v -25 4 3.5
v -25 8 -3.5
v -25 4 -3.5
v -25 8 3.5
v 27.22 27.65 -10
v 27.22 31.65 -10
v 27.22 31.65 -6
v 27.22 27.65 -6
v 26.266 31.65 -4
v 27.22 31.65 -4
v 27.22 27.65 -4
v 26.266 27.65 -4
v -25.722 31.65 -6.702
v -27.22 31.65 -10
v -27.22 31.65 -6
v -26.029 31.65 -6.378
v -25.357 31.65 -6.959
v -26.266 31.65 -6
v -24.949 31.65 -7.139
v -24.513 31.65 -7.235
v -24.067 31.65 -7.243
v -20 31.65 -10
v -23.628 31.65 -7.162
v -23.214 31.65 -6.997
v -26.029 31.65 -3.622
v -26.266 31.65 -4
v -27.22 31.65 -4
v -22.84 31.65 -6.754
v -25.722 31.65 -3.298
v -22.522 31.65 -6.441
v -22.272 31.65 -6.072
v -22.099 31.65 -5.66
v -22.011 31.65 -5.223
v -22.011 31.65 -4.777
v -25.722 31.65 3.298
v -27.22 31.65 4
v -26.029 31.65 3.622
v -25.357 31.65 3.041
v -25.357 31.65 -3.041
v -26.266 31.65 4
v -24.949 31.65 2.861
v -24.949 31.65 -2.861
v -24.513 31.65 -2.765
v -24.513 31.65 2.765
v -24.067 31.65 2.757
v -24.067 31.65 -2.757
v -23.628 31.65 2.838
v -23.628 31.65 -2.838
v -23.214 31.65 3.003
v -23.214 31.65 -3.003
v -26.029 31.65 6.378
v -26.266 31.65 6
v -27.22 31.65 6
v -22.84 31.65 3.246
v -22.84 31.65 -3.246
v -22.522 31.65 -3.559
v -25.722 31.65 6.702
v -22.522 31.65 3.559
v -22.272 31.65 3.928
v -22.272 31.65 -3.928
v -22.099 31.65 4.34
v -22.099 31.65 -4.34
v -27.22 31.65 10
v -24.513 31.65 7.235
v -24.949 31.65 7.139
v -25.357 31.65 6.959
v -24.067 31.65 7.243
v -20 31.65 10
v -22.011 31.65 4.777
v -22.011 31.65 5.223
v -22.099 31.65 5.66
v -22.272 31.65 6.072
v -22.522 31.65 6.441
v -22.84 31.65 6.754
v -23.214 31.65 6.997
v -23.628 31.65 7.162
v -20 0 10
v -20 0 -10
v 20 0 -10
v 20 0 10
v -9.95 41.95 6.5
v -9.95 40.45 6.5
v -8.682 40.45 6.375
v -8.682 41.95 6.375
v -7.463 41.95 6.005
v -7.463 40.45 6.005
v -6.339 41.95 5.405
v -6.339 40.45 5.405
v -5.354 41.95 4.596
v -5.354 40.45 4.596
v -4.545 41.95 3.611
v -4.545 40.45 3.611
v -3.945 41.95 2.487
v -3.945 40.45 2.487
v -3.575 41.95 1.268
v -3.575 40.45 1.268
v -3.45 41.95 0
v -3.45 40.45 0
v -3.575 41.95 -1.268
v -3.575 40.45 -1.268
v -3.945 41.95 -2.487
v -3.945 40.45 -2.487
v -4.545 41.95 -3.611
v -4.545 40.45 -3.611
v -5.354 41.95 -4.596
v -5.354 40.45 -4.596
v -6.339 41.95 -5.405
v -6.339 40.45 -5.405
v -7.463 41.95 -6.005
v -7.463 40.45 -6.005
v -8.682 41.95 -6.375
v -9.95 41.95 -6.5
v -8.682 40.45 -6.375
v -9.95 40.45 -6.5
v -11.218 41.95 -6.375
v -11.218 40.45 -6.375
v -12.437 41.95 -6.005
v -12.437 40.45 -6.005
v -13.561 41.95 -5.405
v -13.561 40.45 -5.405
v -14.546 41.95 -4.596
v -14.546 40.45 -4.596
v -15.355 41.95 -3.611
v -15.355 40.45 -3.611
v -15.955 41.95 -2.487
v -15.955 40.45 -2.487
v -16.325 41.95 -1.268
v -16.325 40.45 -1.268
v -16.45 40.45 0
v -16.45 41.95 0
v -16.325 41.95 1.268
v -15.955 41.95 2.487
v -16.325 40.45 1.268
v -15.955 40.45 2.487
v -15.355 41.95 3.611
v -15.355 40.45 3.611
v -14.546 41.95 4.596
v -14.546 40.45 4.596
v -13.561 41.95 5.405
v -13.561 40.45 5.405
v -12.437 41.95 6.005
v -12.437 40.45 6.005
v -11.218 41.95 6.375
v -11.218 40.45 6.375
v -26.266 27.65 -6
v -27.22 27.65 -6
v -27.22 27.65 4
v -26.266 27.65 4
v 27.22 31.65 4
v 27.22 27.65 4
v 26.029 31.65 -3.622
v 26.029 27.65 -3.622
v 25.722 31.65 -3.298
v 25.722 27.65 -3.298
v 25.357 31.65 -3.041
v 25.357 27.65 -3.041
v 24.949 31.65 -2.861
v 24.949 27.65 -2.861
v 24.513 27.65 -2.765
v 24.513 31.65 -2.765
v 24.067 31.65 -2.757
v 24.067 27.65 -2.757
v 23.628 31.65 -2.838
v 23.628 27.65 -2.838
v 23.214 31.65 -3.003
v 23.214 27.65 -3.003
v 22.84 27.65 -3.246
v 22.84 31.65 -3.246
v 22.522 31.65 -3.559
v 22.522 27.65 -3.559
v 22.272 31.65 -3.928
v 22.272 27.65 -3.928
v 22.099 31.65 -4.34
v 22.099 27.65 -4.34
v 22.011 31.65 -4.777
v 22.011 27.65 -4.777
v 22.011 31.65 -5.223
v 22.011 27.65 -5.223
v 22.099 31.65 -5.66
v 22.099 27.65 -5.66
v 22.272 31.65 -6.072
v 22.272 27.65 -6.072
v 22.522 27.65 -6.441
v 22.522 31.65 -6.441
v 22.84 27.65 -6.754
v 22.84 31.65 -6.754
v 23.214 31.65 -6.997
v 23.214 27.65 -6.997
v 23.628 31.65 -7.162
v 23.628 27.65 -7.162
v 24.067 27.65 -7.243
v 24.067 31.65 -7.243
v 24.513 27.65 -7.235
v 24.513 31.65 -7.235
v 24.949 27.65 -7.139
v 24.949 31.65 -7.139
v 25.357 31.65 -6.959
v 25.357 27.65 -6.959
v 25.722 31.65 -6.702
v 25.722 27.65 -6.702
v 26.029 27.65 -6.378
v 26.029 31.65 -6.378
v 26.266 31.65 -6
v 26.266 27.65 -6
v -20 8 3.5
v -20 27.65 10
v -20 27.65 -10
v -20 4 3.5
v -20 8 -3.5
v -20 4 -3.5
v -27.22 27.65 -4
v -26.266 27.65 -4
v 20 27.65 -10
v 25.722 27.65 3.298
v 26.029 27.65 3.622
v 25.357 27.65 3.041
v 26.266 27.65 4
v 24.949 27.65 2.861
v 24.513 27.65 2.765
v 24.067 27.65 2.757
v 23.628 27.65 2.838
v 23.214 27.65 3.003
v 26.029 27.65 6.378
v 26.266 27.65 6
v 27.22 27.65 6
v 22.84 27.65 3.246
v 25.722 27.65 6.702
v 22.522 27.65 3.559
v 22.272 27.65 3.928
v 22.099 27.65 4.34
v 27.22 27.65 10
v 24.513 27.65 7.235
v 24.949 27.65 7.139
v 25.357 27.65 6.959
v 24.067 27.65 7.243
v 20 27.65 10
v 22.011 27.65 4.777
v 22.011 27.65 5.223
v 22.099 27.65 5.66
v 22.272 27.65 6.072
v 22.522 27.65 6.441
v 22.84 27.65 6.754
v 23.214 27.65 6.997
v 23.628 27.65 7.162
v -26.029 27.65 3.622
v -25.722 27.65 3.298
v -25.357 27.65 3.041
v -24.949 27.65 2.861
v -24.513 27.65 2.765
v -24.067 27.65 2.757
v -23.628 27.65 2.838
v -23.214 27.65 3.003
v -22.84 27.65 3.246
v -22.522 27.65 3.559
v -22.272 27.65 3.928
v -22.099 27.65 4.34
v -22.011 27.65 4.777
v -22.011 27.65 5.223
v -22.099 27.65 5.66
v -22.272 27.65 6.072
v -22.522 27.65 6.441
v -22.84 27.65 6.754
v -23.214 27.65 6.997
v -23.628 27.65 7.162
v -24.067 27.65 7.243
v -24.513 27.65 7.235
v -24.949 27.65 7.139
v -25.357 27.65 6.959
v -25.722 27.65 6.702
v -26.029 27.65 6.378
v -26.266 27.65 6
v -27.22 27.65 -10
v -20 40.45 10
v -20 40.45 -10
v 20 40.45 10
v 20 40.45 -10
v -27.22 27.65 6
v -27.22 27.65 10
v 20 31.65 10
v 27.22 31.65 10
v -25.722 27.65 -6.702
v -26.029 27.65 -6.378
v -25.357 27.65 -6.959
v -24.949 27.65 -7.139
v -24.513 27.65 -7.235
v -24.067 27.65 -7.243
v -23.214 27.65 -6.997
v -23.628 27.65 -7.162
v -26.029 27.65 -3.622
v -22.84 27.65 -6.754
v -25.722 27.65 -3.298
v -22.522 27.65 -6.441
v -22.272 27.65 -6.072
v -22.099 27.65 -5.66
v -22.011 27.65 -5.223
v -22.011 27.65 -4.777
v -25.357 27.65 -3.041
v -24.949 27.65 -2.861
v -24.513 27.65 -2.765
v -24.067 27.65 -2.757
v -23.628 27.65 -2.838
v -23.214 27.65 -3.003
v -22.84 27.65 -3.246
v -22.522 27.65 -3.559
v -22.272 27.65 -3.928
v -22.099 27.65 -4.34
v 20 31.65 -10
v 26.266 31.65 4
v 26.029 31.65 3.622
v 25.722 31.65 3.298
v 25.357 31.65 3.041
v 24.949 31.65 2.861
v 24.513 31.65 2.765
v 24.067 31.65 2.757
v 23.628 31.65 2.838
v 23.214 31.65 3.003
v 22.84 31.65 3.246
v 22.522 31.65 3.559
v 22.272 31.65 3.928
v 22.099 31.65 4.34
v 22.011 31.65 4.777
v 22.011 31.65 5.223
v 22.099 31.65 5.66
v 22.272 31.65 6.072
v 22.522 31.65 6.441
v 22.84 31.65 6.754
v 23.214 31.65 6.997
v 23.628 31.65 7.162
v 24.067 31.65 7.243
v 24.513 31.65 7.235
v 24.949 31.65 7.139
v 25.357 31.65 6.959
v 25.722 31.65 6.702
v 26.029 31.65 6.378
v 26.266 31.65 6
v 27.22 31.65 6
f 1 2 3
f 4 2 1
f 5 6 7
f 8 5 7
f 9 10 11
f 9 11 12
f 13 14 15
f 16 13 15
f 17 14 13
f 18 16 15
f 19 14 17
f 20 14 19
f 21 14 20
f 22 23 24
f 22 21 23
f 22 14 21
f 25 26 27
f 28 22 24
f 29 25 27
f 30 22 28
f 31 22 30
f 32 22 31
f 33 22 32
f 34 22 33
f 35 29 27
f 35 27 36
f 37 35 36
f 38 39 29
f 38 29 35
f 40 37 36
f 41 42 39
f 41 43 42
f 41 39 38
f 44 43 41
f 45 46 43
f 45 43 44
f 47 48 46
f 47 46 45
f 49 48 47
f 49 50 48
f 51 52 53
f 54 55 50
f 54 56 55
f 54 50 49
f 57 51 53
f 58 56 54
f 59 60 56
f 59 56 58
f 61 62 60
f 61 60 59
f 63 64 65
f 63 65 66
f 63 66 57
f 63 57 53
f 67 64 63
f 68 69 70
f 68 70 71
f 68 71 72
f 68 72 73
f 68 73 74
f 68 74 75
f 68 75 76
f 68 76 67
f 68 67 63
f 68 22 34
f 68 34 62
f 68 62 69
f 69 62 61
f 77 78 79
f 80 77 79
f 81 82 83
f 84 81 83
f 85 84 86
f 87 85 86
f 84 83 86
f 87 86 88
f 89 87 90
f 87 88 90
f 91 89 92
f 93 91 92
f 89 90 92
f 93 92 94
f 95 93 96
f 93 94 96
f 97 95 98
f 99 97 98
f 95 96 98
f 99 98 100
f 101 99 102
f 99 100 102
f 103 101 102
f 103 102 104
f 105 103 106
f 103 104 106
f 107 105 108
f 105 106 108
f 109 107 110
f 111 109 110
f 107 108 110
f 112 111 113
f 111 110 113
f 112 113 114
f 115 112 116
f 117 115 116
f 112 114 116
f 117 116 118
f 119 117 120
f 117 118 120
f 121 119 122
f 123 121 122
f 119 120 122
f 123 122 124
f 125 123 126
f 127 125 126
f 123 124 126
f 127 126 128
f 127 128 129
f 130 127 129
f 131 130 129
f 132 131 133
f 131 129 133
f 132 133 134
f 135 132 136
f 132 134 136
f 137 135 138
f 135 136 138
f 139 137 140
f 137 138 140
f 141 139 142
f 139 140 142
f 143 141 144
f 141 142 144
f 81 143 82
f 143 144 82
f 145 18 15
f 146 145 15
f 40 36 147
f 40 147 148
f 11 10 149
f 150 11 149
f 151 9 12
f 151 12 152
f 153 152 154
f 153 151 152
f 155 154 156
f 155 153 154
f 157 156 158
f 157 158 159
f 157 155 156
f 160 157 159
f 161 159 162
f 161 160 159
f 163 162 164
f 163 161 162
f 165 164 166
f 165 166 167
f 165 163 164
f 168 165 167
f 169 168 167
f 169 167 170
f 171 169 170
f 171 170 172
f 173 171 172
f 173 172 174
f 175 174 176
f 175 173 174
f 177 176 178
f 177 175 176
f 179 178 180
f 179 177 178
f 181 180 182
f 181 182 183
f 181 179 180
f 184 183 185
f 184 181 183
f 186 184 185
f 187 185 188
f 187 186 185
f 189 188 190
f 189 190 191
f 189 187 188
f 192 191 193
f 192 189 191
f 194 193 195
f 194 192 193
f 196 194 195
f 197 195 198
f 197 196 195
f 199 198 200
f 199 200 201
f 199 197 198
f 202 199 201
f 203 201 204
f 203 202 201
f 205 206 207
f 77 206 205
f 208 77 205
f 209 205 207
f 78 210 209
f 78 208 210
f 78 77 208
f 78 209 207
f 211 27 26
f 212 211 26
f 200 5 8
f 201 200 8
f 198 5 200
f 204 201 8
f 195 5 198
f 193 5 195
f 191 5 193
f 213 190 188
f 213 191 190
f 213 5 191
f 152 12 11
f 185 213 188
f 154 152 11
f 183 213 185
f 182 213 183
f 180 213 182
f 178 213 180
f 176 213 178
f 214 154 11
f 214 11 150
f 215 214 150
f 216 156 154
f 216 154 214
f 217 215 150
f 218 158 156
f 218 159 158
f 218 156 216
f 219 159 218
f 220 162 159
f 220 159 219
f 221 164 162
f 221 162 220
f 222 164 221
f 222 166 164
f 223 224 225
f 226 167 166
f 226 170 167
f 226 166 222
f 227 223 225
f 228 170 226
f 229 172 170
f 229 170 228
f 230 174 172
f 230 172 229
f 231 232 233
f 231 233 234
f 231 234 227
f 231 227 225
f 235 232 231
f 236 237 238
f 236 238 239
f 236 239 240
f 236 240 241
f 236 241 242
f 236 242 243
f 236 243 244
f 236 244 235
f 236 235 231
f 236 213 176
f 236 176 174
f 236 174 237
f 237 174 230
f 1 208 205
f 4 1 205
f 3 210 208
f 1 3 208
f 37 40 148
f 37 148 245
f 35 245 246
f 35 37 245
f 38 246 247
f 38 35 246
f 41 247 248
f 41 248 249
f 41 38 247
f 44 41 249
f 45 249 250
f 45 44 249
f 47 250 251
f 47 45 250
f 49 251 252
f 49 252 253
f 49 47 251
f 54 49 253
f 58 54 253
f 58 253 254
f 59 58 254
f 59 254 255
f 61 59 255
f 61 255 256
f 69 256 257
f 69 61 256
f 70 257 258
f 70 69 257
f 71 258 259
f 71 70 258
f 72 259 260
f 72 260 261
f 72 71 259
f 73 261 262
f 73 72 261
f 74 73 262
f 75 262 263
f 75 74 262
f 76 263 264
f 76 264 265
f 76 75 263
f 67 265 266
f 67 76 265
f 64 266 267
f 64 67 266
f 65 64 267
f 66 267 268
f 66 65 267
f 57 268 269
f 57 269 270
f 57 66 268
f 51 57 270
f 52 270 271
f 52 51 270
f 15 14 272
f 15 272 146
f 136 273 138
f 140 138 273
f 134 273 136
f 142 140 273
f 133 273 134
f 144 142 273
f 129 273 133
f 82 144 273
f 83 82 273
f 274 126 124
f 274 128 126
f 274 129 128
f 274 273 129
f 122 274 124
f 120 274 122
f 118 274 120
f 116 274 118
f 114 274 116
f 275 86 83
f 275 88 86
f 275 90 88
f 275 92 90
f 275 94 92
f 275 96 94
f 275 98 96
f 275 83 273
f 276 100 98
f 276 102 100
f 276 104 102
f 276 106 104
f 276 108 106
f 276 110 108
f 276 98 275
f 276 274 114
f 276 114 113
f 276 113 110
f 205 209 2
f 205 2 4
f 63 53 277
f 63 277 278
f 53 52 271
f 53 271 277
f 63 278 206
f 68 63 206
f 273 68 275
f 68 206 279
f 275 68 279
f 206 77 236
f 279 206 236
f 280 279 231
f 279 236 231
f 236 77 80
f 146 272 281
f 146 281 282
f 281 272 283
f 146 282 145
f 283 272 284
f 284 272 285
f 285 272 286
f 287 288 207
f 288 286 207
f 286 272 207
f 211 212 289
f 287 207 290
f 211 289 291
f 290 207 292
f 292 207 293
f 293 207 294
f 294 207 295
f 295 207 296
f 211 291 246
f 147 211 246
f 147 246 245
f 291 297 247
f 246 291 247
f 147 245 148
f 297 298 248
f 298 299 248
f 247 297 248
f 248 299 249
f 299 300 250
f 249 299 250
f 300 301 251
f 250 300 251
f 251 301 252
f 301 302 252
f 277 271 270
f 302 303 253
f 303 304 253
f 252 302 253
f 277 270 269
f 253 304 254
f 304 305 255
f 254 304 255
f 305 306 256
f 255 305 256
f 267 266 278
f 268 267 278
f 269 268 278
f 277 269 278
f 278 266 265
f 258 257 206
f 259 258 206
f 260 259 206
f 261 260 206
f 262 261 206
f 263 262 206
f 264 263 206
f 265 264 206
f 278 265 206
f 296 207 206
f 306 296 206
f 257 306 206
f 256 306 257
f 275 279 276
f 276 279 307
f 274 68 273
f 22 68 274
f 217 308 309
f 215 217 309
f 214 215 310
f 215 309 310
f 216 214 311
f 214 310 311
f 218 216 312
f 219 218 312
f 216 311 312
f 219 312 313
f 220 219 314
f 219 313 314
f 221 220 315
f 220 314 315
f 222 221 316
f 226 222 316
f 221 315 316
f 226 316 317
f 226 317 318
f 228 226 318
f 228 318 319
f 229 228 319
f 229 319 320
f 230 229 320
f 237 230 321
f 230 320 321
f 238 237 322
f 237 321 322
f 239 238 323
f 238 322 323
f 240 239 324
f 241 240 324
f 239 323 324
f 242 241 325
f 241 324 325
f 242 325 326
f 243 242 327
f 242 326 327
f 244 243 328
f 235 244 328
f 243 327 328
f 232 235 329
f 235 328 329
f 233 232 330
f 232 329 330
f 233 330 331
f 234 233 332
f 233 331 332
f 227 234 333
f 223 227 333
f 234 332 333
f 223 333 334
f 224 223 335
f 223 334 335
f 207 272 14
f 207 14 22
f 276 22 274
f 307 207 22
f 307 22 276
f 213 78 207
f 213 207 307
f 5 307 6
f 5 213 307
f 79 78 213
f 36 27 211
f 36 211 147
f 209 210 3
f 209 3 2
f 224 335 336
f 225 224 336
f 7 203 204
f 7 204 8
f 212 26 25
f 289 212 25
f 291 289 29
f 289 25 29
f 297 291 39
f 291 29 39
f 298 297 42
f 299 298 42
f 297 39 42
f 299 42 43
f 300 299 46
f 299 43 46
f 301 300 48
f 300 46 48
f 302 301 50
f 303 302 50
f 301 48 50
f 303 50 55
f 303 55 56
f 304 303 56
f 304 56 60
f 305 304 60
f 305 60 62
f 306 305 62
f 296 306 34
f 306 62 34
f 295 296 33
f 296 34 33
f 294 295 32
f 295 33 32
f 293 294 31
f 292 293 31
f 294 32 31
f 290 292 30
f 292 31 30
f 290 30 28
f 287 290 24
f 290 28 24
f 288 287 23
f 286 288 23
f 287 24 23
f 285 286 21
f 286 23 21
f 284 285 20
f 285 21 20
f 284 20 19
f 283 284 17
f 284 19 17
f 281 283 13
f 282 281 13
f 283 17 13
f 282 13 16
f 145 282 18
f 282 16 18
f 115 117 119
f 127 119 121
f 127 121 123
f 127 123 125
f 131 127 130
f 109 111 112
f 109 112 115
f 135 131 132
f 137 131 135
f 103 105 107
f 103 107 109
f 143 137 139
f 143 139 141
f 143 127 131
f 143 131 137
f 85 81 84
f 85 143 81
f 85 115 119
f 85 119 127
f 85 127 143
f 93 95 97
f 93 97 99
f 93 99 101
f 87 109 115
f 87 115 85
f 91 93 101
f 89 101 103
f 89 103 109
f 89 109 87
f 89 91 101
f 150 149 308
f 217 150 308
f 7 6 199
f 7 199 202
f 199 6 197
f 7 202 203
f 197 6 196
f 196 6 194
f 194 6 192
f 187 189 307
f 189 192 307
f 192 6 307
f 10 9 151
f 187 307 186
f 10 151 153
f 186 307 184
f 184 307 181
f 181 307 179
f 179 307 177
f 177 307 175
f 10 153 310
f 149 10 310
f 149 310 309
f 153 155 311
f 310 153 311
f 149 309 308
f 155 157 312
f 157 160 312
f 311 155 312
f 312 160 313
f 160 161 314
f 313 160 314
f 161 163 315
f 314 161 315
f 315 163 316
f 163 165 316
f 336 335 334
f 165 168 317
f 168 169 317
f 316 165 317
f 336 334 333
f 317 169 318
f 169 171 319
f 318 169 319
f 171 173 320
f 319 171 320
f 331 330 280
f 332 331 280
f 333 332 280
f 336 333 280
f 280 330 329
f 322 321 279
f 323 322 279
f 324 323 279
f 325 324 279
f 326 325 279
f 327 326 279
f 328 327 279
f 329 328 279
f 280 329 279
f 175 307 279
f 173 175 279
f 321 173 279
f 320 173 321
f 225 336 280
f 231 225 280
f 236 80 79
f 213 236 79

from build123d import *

# Parameters (mm, degrees)
SKETCH2_W             = 40
SKETCH2_H             = 20
BOSS_EXTRUDE1_DEPTH   = 27.65
SKETCH3_W             = 7
SKETCH3_H             = 4
BOSS_EXTRUDE2_DEPTH   = 5
SKETCH5_W             = 40
SKETCH5_H             = 20
BOSS_EXTRUDE5_DEPTH   = 12.8
SKETCH7_W             = 20
SKETCH7_H             = 4
BOSS_EXTRUDE6_DEPTH   = 7.22
CUT_EXTRUDE3_DEPTH    = 4
MIRROR11_COPY_1_DEPTH = 4
SKETCH9_R             = 6.5
BOSS_EXTRUDE8_DEPTH   = 1.5


with BuildPart() as part:
    # Sketch2 → Boss-Extrude1 (new body)
    with BuildSketch(Plane(origin=(0, 0, 0), x_dir=(1, 0, 0), z_dir=(0, 1, 0))):
        Rectangle(SKETCH2_W, SKETCH2_H)
    extrude(amount=BOSS_EXTRUDE1_DEPTH)

    # Sketch3 → Boss-Extrude2 (add)
    with BuildSketch(Plane.ZY.offset(20)):
        with Locations((0, 6)):
            Rectangle(SKETCH3_W, SKETCH3_H)
    extrude(amount=BOSS_EXTRUDE2_DEPTH)

    # Sketch5 → Boss-Extrude5 (add)
    with BuildSketch(Plane(origin=(0, 27.65, 0), x_dir=(1, 0, 0), z_dir=(0, 1, 0))):
        Rectangle(SKETCH5_W, SKETCH5_H)
    extrude(amount=BOSS_EXTRUDE5_DEPTH)

    # Sketch7 → Boss-Extrude6 (add)
    with BuildSketch(Plane.ZY.offset(20)):
        with Locations((0, 29.65)):
            Rectangle(SKETCH7_W, SKETCH7_H)
    boss_extrude6 = extrude(amount=BOSS_EXTRUDE6_DEPTH)

    # Sketch8 → Cut-Extrude3 (cut)
    with BuildSketch(Plane(origin=(0, 31.65, 0), x_dir=(1, 0, 0), z_dir=(0, 1, 0))):
        with BuildLine():
            Line((-26.265564437, 6), (-27.22, 6))
            Line((-27.22, 6), (-27.22, 4))
            Line((-27.22, 4), (-26.265564437, 4))
            ThreePointArc((-26.265564437, 4), (-22, 5), (-26.265564437, 6))
        make_face()
    cut_extrude3 = extrude(amount=-CUT_EXTRUDE3_DEPTH, mode=Mode.SUBTRACT)

    # Mirror10: Cut-Extrude3 across plane
    add(cut_extrude3.mirror(Plane.XY), mode=Mode.SUBTRACT)

    # Mirror11: Boss-Extrude6, Cut-Extrude3 across plane
    add(boss_extrude6.mirror(Plane(origin=(0, 0, 0), x_dir=(0, 0, 1), z_dir=(1, 0, 0))))
    add(cut_extrude3.mirror(Plane(origin=(0, 0, 0), x_dir=(0, 0, 1), z_dir=(1, 0, 0))), mode=Mode.SUBTRACT)

    # Mirror11 copy 1 sketch → Mirror11 copy 1 (cut)
    with BuildSketch(Plane(origin=(0, 31.65, 0), x_dir=(-1, 0, 0), z_dir=(0, 1, 0))):
        with BuildLine():
            Line((-26.265564437, 6), (-27.22, 6))
            Line((-27.22, 6), (-27.22, 4))
            Line((-27.22, 4), (-26.265564437, 4))
            ThreePointArc((-26.265564437, 4), (-22, 5), (-26.265564437, 6))
        make_face()
    extrude(amount=-MIRROR11_COPY_1_DEPTH, mode=Mode.SUBTRACT)

    # Sketch9 → Boss-Extrude8 (add)
    with BuildSketch(Plane(origin=(0, 40.45, 0), x_dir=(1, 0, 0), z_dir=(0, 1, 0))):
        with Locations(Location((-9.95, 0, 0), (0, 0, 270))):
            Circle(SKETCH9_R)
    extrude(amount=BOSS_EXTRUDE8_DEPTH)


solid = part.part
